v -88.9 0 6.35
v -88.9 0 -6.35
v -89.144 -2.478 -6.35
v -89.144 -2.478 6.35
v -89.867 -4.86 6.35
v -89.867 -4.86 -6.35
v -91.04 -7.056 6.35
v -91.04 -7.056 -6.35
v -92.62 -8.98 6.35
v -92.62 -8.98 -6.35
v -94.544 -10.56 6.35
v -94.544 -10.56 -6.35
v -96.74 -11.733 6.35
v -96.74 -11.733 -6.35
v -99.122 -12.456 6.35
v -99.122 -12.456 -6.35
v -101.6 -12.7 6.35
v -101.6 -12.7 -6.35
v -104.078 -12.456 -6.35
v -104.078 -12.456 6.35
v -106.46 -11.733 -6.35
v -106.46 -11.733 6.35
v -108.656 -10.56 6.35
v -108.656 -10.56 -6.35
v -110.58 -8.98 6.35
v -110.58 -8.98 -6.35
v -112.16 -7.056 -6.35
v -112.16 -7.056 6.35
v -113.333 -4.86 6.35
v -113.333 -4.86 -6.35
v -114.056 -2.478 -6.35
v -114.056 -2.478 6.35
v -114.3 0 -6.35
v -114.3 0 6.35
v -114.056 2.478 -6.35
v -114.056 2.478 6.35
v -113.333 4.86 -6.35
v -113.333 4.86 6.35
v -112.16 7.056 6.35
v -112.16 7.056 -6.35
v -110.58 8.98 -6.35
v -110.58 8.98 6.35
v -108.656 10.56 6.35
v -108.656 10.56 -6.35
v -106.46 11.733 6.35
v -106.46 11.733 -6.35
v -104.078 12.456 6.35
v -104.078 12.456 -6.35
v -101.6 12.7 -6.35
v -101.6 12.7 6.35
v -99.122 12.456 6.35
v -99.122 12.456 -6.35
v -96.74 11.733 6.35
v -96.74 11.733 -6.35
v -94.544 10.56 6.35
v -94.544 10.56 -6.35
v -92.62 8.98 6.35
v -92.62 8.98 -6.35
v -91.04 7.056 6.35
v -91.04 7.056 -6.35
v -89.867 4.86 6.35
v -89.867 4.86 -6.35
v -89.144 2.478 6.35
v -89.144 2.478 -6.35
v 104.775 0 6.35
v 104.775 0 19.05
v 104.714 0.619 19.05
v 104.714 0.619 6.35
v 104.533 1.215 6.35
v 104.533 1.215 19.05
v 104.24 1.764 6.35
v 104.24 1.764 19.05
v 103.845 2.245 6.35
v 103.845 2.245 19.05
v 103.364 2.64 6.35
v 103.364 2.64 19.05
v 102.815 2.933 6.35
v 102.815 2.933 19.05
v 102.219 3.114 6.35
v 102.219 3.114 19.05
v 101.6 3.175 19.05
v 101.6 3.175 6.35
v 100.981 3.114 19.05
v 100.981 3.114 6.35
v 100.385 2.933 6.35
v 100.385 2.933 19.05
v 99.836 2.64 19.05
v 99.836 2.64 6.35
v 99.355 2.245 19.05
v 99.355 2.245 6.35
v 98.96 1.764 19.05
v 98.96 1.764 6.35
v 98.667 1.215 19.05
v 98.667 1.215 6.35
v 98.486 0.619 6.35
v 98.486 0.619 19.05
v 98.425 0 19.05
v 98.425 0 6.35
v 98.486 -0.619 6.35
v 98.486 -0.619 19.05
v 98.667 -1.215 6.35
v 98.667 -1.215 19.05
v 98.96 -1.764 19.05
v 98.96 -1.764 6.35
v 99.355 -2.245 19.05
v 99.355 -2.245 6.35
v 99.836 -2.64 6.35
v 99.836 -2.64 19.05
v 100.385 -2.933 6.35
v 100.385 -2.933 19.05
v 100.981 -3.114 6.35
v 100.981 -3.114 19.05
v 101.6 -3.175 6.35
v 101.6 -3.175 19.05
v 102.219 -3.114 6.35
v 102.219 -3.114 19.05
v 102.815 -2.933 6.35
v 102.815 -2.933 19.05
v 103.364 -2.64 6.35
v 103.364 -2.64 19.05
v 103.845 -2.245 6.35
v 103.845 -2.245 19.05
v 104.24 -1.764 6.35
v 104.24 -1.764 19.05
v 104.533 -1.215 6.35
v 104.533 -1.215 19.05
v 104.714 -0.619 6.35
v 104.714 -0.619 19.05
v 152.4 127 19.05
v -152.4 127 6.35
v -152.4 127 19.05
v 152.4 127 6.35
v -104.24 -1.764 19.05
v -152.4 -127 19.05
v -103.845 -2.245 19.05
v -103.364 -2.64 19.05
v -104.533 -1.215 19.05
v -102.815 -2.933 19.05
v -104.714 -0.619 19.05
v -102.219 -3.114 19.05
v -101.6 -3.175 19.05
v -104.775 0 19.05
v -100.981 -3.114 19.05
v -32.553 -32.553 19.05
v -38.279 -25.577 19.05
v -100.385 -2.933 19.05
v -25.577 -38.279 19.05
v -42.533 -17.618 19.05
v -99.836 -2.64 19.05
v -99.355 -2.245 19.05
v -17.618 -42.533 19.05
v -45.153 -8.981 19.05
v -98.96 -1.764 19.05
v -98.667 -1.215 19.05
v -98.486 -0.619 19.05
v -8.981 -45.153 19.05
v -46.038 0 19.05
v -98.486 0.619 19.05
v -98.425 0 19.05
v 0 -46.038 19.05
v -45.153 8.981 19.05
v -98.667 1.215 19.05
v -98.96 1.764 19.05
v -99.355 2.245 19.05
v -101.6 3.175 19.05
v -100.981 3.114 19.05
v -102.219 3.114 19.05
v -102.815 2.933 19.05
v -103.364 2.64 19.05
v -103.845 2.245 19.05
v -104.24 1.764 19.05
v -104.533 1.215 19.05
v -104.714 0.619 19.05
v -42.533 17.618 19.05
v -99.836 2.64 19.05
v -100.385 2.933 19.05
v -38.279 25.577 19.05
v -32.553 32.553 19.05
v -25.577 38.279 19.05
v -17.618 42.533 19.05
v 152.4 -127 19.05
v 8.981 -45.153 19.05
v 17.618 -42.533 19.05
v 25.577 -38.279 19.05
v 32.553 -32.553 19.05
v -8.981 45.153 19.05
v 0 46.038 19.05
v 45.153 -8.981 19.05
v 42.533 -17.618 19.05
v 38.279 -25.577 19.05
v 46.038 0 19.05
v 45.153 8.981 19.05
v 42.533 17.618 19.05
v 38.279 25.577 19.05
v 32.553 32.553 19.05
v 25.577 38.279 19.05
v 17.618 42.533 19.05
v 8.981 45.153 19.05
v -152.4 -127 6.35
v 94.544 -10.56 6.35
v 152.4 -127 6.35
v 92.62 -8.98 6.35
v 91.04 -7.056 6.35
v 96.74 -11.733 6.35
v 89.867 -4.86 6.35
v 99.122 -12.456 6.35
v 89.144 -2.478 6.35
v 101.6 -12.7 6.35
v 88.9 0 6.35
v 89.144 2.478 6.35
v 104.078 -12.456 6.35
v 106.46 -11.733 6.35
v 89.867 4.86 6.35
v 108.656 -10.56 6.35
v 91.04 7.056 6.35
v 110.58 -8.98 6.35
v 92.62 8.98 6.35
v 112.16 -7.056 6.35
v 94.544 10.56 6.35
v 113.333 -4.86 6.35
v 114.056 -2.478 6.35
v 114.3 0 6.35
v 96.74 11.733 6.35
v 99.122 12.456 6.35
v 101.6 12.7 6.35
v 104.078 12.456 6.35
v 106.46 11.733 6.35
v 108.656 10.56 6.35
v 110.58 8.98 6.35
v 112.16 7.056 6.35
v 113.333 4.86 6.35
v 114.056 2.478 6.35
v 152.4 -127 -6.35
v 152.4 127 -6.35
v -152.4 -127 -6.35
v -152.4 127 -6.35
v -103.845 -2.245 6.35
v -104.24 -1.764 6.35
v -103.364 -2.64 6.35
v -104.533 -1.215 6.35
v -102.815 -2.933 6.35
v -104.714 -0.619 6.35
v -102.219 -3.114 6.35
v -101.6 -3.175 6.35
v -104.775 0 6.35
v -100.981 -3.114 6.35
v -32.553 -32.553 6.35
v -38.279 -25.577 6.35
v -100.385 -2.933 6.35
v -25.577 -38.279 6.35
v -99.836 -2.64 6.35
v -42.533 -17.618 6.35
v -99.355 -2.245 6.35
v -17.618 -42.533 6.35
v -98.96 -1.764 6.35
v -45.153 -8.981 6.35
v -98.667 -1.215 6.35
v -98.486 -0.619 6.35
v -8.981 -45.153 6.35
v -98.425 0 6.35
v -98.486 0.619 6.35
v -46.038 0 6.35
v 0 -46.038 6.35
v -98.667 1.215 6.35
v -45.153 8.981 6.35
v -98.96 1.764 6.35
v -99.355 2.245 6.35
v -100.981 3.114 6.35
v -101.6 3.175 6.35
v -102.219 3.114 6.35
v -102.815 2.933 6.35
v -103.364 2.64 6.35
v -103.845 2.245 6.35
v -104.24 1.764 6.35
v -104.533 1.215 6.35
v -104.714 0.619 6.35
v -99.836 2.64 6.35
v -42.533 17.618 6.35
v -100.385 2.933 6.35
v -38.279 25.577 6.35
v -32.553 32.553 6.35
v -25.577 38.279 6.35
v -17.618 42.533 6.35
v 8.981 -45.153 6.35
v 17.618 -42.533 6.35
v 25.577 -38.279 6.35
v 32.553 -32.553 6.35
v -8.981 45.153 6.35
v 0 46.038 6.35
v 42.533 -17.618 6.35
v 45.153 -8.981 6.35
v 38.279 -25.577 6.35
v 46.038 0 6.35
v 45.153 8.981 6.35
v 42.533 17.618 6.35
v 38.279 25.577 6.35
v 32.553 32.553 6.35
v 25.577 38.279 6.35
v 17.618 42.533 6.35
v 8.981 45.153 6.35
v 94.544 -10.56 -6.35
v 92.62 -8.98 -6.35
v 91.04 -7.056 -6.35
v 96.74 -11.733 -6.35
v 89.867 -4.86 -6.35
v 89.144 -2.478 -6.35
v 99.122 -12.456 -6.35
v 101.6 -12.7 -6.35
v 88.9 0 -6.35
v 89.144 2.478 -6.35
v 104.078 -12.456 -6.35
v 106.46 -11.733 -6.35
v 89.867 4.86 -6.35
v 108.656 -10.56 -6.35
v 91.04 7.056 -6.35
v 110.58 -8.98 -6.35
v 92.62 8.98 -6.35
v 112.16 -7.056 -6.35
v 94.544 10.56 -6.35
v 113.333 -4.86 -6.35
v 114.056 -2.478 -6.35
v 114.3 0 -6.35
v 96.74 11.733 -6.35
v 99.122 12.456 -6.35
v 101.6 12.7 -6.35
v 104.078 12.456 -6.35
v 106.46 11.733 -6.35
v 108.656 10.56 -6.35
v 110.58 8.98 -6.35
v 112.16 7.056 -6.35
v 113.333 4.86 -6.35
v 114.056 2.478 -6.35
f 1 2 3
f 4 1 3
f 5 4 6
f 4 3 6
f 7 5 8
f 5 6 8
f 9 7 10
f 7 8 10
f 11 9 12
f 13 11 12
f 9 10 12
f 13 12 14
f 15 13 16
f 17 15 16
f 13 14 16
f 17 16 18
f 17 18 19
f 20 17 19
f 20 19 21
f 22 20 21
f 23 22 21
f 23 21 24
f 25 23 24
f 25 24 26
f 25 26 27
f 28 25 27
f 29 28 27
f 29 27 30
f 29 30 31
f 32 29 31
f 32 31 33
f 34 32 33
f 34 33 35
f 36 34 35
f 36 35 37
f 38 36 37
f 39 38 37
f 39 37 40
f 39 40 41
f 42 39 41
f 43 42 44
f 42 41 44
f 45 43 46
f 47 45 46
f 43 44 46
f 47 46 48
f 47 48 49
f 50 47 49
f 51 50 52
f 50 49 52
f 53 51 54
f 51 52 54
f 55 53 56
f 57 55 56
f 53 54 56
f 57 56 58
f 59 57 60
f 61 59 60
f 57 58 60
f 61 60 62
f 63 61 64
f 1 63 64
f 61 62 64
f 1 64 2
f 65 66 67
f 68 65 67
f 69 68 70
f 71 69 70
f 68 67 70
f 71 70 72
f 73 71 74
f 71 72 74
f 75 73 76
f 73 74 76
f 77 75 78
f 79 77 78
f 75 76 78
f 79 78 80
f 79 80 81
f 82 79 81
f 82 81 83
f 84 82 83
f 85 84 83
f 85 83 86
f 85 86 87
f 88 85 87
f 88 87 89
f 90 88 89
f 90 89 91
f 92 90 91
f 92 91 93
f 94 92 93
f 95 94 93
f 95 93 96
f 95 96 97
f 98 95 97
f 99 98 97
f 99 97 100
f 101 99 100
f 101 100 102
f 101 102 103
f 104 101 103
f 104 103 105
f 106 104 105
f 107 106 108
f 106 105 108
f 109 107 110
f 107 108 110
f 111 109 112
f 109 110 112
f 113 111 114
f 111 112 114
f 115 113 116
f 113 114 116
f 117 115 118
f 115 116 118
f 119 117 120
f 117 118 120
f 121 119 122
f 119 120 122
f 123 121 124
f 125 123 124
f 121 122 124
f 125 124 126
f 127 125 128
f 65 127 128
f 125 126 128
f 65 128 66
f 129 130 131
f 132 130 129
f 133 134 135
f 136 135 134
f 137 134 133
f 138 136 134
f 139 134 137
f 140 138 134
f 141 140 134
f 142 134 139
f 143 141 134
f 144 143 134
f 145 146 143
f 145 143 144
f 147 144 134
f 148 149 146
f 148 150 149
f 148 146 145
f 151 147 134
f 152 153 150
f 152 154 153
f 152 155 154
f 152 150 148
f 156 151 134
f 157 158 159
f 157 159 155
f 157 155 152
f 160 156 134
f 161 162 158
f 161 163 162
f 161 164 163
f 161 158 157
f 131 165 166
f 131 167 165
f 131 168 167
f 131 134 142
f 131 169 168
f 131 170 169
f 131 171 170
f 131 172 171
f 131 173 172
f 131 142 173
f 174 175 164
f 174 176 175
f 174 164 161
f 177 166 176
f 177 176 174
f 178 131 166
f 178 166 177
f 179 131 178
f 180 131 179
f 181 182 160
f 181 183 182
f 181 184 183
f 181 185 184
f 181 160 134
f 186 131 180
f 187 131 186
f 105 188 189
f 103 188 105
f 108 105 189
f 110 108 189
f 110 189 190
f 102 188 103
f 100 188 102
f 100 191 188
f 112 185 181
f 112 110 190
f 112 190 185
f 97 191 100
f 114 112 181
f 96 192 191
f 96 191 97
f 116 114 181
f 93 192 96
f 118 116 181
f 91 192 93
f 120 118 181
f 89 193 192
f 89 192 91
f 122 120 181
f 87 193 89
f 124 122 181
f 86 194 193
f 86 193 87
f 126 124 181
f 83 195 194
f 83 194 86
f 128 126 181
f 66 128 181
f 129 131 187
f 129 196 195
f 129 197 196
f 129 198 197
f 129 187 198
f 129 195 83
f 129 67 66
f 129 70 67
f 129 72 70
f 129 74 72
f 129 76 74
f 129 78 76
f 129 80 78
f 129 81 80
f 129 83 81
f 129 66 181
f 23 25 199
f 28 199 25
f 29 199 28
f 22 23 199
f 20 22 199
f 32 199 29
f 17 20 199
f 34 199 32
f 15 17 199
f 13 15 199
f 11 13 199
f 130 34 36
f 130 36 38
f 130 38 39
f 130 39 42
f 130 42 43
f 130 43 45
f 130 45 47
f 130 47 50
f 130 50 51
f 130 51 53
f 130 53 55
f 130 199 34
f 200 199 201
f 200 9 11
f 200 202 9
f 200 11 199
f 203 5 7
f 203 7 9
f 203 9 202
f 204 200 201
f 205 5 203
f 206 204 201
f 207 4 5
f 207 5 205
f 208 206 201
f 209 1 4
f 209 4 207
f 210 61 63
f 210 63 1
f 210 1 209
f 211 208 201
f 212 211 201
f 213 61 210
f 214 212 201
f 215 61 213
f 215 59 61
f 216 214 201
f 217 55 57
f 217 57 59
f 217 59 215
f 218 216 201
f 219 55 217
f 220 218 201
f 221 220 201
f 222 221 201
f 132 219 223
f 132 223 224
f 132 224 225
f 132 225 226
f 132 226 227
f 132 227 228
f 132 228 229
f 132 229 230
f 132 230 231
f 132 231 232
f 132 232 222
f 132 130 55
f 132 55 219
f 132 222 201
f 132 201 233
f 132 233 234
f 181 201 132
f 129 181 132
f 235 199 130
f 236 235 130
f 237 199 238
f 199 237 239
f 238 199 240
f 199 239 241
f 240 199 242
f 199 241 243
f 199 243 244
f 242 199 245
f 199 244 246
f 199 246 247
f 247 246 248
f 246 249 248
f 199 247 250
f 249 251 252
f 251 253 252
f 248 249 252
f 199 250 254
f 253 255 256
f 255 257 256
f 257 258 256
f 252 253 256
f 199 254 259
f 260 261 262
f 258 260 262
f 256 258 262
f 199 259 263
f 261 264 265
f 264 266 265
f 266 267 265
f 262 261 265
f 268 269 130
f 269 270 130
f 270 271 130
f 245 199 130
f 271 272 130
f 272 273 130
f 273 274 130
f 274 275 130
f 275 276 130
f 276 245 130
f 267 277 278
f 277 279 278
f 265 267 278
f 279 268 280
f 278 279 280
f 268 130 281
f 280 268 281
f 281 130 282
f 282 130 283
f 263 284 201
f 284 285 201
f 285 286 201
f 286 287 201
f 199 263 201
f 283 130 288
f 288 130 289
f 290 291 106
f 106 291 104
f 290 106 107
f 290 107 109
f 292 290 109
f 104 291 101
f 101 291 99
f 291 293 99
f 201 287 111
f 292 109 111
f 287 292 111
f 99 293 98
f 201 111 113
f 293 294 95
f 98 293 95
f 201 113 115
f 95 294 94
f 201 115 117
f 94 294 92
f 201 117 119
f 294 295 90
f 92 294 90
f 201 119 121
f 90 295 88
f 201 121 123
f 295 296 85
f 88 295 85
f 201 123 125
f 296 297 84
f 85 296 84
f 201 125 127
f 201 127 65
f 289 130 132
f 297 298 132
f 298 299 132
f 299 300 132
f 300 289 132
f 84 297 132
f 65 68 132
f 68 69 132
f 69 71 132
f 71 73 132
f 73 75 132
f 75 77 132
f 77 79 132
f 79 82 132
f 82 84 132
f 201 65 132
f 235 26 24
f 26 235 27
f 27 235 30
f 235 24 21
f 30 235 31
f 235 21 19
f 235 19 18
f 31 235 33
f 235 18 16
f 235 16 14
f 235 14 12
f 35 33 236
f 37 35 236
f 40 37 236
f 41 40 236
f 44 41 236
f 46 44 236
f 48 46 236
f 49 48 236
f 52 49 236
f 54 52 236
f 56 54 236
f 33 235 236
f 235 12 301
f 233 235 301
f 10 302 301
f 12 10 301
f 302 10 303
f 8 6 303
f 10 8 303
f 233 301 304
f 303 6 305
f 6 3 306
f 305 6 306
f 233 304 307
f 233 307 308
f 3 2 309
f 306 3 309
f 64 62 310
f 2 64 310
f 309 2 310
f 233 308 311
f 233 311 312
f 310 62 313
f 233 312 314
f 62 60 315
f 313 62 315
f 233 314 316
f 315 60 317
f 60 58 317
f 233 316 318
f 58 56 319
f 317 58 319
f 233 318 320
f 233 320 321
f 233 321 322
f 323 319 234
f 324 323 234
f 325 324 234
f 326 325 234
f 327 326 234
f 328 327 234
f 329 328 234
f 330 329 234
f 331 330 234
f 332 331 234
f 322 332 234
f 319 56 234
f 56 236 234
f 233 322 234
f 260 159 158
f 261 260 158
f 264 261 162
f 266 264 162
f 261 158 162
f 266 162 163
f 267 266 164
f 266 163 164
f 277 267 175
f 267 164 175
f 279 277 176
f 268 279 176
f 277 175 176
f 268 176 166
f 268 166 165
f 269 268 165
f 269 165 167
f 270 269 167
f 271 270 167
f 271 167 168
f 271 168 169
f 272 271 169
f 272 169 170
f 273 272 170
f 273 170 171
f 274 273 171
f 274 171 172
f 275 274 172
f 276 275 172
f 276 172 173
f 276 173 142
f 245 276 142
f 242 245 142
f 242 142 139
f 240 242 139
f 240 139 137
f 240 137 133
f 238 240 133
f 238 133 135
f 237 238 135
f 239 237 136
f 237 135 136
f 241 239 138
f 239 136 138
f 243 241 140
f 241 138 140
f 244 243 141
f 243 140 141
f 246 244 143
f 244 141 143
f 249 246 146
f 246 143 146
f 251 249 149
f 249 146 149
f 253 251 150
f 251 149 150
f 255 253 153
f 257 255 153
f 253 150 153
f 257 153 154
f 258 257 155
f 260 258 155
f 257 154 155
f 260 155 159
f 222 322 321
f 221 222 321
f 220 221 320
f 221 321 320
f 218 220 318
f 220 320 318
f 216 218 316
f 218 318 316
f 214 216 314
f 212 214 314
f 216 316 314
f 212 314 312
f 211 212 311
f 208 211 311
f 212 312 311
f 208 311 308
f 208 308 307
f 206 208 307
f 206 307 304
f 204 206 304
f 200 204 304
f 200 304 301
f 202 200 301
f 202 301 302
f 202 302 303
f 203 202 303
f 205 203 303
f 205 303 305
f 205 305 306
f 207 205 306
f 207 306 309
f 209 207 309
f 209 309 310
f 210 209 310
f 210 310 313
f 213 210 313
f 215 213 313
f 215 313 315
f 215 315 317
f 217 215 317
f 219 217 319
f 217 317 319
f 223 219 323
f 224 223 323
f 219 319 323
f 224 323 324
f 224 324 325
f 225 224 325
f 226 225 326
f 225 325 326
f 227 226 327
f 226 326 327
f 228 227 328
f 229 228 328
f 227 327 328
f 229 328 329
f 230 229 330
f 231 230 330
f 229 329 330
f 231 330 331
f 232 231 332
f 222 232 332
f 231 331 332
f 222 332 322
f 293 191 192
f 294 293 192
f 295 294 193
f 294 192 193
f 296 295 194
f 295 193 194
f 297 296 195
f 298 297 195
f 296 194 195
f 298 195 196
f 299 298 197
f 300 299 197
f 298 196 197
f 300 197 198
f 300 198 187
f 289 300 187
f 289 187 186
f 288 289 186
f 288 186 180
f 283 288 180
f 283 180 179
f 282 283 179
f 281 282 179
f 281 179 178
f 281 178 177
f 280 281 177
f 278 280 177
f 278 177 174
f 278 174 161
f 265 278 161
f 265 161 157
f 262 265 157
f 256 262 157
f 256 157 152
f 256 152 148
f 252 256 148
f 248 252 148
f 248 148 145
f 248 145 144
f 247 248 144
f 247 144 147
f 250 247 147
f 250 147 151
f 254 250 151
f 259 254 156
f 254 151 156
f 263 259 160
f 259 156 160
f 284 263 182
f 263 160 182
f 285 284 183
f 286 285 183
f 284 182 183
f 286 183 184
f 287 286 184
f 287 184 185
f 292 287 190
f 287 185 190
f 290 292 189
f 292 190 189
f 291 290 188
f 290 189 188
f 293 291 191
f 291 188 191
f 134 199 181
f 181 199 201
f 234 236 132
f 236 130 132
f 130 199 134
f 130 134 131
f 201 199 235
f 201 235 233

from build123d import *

# Parameters (mm, degrees)
F0_W     = 304.8
F0_H     = 254
F1_DEPTH = 6.35
F2_DEPTH = 12.7
F3_R     = 46.0375
F4_DEPTH = 25.401
F5_R     = 12.7
F6_DEPTH = 25.4
F7_R     = 3.175
F8_DEPTH = 25.401


with BuildPart() as f1:
    # F0 (on Top) → F1 (new body, symmetric)
    with BuildSketch(Plane.XY):
        Rectangle(F0_W, F0_H)
    extrude(amount=F1_DEPTH, both=True)


with BuildPart() as f2:
    # F2 (new): a face of the model
    f2_faces = [f1.part.faces().sort_by_distance(p)[0] for p in [
        (0, 0, 6.35),
    ]]
    extrude(f2_faces, amount=F2_DEPTH)

    # F3 (on face) → F4 (cut, through all)
    with BuildSketch(Plane.XY.offset(19.05)):
        Circle(F3_R)
    extrude(amount=-F4_DEPTH, mode=Mode.SUBTRACT)

    # F7 (on face) → F8 (cut, through all)
    with BuildSketch(Plane.XY.offset(19.05)):
        with Locations((-101.6, 0)):
            Circle(F7_R)
        with Locations((101.6, 0)):
            Circle(F7_R)
    extrude(amount=-F8_DEPTH, mode=Mode.SUBTRACT)


with BuildPart() as f1_1:
    add(f1.part)

    # F5 (on face) → F6 (cut)
    with BuildSketch(Plane(origin=(0, 0, -6.35), x_dir=(1, 0, 0), z_dir=(0, 0, -1))):
        with Locations((-101.6, 0)):
            Circle(F5_R)
        with Locations((101.6, 0)):
            Circle(F5_R)
    extrude(amount=-F6_DEPTH, mode=Mode.SUBTRACT)


solid = Compound([f2.part, f1_1.part])
